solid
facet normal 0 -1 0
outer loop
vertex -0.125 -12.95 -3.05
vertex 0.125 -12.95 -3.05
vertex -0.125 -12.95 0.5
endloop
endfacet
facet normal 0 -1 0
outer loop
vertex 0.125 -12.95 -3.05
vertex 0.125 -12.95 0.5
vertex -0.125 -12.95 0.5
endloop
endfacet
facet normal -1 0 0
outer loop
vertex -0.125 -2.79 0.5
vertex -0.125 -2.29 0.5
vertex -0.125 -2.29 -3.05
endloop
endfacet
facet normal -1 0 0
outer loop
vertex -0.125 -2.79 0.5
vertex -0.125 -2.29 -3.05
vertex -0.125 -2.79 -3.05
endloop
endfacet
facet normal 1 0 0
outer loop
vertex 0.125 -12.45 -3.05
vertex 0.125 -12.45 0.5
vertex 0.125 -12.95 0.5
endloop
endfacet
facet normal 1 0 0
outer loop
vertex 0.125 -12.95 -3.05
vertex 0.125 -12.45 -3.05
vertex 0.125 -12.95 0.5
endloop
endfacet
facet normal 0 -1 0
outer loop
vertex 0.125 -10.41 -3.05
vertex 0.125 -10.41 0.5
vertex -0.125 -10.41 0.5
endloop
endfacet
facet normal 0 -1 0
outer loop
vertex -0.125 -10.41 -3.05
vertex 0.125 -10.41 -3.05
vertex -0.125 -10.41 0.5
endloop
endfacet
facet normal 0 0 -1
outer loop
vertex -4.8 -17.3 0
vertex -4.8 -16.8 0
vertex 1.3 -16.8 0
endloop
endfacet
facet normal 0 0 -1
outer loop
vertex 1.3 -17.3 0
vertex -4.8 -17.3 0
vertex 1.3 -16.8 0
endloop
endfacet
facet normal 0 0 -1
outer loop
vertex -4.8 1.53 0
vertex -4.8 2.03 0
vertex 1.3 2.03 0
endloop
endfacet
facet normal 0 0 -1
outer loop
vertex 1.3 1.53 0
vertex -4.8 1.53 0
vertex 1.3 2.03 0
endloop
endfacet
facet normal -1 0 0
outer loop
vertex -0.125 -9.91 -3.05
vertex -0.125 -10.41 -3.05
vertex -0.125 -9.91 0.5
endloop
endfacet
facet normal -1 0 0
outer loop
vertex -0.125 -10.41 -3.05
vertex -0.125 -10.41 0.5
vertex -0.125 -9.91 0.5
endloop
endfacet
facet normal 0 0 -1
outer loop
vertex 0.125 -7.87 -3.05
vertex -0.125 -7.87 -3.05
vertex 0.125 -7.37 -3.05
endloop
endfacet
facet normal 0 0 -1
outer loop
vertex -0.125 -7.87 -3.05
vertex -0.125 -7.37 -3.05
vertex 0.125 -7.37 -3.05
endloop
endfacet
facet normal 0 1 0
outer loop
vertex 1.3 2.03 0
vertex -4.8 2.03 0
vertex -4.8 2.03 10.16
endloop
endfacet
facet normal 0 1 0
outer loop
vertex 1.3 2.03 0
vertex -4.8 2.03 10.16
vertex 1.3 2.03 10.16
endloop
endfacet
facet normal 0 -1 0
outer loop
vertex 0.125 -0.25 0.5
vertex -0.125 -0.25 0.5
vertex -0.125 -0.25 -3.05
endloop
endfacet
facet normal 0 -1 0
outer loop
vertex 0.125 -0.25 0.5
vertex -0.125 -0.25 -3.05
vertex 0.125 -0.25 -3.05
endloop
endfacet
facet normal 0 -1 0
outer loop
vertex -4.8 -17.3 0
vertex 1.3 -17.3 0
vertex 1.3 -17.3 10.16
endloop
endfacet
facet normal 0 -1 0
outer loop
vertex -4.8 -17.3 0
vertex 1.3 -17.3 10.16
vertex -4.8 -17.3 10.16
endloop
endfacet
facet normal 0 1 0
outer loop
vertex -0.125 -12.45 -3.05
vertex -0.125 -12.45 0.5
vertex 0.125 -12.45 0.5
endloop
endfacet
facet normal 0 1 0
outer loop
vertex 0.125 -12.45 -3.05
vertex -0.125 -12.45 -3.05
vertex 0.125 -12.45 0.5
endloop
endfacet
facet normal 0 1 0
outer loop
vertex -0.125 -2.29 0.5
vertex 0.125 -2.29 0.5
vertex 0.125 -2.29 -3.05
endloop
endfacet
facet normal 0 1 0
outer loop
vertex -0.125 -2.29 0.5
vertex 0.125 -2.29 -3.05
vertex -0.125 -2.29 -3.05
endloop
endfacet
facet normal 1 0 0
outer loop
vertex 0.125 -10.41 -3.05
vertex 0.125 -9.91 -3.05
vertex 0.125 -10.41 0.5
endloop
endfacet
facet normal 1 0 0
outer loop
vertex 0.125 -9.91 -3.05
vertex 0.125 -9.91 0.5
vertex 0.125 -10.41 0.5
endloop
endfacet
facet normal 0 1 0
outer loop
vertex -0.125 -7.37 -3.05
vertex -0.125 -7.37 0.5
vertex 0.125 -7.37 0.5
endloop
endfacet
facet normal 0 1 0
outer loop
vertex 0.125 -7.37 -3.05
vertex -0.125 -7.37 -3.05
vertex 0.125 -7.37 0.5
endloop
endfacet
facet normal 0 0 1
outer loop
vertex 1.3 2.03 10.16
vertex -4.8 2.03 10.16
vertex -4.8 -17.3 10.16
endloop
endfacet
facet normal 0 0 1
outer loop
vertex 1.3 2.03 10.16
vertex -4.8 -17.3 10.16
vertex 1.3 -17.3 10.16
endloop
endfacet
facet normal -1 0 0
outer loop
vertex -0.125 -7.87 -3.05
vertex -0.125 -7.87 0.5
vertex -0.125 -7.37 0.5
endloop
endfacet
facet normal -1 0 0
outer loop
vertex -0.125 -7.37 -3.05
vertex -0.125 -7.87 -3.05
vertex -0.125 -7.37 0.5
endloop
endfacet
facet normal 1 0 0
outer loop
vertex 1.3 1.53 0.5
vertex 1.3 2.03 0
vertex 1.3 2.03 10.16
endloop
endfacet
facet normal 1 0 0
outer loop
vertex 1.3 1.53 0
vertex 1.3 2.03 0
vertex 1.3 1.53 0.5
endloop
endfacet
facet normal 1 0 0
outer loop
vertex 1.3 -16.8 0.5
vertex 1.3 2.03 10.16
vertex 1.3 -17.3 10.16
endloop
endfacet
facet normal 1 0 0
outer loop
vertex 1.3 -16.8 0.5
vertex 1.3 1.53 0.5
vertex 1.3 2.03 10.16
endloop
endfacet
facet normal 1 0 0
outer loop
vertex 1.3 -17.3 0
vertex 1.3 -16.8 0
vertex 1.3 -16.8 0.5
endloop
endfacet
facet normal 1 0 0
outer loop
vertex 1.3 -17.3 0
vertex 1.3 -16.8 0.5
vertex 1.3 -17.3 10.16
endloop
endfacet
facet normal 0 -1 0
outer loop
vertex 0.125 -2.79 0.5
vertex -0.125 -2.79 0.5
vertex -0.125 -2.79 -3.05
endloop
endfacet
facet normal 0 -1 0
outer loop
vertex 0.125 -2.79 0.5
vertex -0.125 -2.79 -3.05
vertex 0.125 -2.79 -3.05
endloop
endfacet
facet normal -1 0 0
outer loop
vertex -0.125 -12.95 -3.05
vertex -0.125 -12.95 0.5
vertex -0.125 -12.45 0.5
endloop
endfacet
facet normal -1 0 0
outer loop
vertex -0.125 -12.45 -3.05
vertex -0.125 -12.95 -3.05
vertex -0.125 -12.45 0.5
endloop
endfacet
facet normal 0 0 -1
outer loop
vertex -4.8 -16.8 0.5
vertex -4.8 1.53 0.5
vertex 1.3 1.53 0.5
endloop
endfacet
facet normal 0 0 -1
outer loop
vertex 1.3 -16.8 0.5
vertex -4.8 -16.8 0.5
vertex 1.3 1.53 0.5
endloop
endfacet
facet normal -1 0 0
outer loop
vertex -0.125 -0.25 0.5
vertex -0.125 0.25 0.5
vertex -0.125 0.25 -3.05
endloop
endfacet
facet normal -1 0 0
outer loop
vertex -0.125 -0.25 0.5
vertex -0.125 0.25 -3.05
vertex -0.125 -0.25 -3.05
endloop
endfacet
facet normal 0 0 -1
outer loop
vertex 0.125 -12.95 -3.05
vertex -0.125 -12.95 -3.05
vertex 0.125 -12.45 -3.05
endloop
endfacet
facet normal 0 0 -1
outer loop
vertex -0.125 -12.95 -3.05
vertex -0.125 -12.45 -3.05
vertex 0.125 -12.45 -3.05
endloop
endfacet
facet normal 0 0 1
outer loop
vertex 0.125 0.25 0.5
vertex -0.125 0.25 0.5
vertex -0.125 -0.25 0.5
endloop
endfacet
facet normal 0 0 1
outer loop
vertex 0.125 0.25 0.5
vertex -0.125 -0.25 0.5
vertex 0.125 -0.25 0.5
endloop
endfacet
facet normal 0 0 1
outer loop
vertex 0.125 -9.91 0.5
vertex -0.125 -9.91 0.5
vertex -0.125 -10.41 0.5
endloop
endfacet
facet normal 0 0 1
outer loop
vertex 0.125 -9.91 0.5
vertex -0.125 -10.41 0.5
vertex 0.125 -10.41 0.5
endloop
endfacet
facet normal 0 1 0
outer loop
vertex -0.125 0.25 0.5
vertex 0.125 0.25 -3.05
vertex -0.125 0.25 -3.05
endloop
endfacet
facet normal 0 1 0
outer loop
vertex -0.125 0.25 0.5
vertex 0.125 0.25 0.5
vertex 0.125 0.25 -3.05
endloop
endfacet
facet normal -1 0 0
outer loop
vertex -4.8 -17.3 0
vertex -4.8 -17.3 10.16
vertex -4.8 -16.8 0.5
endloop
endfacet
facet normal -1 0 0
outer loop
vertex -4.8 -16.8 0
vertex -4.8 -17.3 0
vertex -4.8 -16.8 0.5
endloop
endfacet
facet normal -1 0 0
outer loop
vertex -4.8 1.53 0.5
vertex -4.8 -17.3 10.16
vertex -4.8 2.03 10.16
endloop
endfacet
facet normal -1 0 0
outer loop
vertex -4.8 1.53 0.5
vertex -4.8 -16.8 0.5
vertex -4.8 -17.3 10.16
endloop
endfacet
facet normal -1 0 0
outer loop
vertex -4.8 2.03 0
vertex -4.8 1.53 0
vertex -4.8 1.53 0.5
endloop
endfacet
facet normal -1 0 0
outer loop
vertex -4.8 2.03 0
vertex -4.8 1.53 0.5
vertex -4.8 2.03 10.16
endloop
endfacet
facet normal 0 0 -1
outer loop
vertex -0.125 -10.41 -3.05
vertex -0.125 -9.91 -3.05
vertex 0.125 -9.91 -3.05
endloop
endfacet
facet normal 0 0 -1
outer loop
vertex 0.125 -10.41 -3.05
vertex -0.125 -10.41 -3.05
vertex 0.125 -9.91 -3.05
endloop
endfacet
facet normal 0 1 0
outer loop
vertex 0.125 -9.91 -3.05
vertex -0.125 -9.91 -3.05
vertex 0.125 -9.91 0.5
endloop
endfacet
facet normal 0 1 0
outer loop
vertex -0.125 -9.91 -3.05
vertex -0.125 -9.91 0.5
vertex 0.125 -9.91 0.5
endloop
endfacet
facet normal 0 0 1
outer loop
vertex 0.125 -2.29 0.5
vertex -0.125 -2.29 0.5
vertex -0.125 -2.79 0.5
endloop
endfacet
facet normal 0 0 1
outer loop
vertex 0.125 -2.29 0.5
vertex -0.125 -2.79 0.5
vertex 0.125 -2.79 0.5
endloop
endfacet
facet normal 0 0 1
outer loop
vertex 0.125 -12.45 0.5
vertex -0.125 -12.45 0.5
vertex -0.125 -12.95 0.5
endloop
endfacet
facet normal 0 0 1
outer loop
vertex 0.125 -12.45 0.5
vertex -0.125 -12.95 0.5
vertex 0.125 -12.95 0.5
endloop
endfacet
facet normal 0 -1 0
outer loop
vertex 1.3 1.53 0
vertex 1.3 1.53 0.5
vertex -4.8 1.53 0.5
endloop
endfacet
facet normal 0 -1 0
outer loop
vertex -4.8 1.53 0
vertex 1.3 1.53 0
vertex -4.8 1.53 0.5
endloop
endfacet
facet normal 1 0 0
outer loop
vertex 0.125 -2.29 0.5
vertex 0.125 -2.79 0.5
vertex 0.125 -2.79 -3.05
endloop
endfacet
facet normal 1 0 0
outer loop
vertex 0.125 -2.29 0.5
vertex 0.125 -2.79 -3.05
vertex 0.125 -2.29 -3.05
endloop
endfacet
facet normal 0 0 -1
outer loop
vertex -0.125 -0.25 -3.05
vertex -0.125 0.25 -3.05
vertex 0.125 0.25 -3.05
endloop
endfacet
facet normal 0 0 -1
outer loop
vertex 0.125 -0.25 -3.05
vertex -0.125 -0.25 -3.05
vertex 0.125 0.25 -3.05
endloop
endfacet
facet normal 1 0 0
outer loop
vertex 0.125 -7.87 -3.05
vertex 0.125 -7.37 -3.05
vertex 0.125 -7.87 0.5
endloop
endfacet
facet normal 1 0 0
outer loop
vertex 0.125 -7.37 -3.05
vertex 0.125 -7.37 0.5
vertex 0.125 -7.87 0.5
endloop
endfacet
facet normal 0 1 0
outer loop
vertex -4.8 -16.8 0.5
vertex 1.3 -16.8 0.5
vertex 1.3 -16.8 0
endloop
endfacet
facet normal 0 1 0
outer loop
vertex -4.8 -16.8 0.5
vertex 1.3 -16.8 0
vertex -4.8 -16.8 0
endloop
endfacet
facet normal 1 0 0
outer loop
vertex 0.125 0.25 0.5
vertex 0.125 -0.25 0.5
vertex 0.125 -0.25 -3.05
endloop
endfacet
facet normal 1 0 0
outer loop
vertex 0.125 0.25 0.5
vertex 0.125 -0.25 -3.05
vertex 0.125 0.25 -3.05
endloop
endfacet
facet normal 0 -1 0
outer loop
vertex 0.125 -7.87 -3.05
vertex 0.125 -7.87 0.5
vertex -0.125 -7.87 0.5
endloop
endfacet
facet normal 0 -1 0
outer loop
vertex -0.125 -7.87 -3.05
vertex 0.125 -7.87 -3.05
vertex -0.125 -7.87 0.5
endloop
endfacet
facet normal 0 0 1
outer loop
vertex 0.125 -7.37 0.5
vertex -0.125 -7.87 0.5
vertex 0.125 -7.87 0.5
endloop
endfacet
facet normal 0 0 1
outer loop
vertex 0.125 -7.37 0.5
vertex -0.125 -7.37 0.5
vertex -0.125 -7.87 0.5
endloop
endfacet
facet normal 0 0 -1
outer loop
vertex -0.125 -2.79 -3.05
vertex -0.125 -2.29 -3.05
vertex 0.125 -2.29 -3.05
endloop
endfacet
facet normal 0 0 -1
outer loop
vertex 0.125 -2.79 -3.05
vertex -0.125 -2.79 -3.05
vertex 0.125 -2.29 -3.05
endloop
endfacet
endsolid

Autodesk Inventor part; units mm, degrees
ref_plane "YZ Plane" through (0, 0, 0) normal (1, 0, 0) x (0, 1, 0)
ref_plane "XZ Plane" through (0, 0, 0) normal (0, 1, 0) x (-1, 0, 0)
ref_plane "XY Plane" through (0, 0, 0) normal (0, 0, 1) x (1, 0, 0)
sketch "Sketch2" plane through (0, 0, 0) normal (0, 0, 1) x (1, 0, 0)
  line L0 (-4.8, 2.03) -> (1.3, 2.03)
  line L1 (1.3, 2.03) -> (1.3, -17.3)
  line L2 (1.3, -17.3) -> (-4.8, -17.3)
  line L3 (-4.8, -17.3) -> (-4.8, 2.03)
  line L4 (-0.125, -0.25) -> (0.125, -0.25)
  line L5 (0.125, -0.25) -> (0.125, 0.25)
  line L6 (0.125, 0.25) -> (-0.125, 0.25)
  line L7 (-0.125, 0.25) -> (-0.125, -0.25)
  line L8 (-0.125, -0.25) -> (0.125, 0.25) construction
  line L9 (0.125, -0.25) -> (-0.125, 0.25) construction
  line L10 (-0.125, -2.79) -> (0.125, -2.79)
  line L11 (0.125, -2.79) -> (0.125, -2.29)
  line L12 (0.125, -2.29) -> (-0.125, -2.29)
  line L13 (-0.125, -2.29) -> (-0.125, -2.79)
  line L14 (-0.125, -2.79) -> (0.125, -2.29) construction
  line L15 (0.125, -2.79) -> (-0.125, -2.29) construction
  line L16 (-0.125, -7.37) -> (0.125, -7.37)
  line L17 (0.125, -7.37) -> (0.125, -7.87)
  line L18 (0.125, -7.87) -> (-0.125, -7.87)
  line L19 (-0.125, -7.87) -> (-0.125, -7.37)
  line L20 (-0.125, -7.37) -> (0.125, -7.87) construction
  line L21 (0.125, -7.37) -> (-0.125, -7.87) construction
  line L22 (-0.125, -9.91) -> (0.125, -9.91)
  line L23 (0.125, -9.91) -> (0.125, -10.41)
  line L24 (-0.125, -10.41) -> (-0.125, -9.91)
  line L25 (-0.125, -9.91) -> (0.125, -10.41) construction
  line L26 (0.125, -9.91) -> (-0.125, -10.41) construction
  line L27 (0.125, -10.41) -> (-0.125, -10.41)
  line L28 (-0.125, -12.45) -> (0.125, -12.45)
  line L29 (0.125, -12.45) -> (0.125, -12.95)
  line L30 (-0.125, -12.95) -> (-0.125, -12.45)
  line L31 (-0.125, -12.45) -> (0.125, -12.95) construction
  line L32 (0.125, -12.45) -> (-0.125, -12.95) construction
  line L33 (0.125, -12.95) -> (-0.125, -12.95)
  line L34 (-4.8, 2.03) -> (1.3, 2.03)
  line L35 (1.3, 2.03) -> (1.3, 1.53)
  line L36 (1.3, 1.53) -> (-4.8, 1.53)
  line L37 (-4.8, 1.53) -> (-4.8, 2.03)
  line L38 (-4.8, -17.3) -> (1.3, -17.3)
  line L39 (1.3, -17.3) -> (1.3, -16.8)
  line L40 (1.3, -16.8) -> (-4.8, -16.8)
  line L41 (-4.8, -16.8) -> (-4.8, -17.3)
  point P0 (0, 0)
  point P1 (0, -2.54)
  point P2 (0, -7.62)
  point P3 (0, -10.16)
  point P4 (0, -12.7)
  dimension "d37" = 2.03
  dimension "d38" = 1.3
  dimension "d39" = 17.3
  dimension "d40" = 6.1
  dimension "d41" = 0.25
  dimension "d42" = 0.5
  dimension "d45" = 2.54
  dimension "d50" = 0.25
  dimension "d51" = 0.5
  dimension "d52" = 0
  dimension "d53" = 7.62
  dimension "d56" = 2.54
  dimension "d61" = 0.5
  dimension "d62" = 0.5
extrude "Extrusion4" add sketch "Sketch2" along normal blind 9.66 contours L0 L1 L36 L3 | L36 L1 L40 L3 | L40 L1 L2 L3 | L7 L6 L5 L4 | L13 L12 L11 L10 | L16 L17 L18 L19 | L22 L23 L27 L24 | L28 L29 L33 L30
extrude "Extrusion5" add sketch "Sketch2" against normal blind 0.5 contours L0 L1 L36 L3 | L40 L1 L2 L3
extrude "Extrusion6" add sketch "Sketch2" against normal blind 3.55 separate body contours L7 L6 L5 L4 | L13 L12 L11 L10 | L16 L17 L18 L19 | L22 L23 L27 L24 | L28 L29 L33 L30
move or copy body "Move Body1" bodies to move or copy 1 2 copy no translate (0, 0, 0.5)
equation "\"d50\" = d41"
equation "\"d51\" = d42"
properties part number "Converter_DCDC_XP_POWER-IAxxxx_SIP_THT"
